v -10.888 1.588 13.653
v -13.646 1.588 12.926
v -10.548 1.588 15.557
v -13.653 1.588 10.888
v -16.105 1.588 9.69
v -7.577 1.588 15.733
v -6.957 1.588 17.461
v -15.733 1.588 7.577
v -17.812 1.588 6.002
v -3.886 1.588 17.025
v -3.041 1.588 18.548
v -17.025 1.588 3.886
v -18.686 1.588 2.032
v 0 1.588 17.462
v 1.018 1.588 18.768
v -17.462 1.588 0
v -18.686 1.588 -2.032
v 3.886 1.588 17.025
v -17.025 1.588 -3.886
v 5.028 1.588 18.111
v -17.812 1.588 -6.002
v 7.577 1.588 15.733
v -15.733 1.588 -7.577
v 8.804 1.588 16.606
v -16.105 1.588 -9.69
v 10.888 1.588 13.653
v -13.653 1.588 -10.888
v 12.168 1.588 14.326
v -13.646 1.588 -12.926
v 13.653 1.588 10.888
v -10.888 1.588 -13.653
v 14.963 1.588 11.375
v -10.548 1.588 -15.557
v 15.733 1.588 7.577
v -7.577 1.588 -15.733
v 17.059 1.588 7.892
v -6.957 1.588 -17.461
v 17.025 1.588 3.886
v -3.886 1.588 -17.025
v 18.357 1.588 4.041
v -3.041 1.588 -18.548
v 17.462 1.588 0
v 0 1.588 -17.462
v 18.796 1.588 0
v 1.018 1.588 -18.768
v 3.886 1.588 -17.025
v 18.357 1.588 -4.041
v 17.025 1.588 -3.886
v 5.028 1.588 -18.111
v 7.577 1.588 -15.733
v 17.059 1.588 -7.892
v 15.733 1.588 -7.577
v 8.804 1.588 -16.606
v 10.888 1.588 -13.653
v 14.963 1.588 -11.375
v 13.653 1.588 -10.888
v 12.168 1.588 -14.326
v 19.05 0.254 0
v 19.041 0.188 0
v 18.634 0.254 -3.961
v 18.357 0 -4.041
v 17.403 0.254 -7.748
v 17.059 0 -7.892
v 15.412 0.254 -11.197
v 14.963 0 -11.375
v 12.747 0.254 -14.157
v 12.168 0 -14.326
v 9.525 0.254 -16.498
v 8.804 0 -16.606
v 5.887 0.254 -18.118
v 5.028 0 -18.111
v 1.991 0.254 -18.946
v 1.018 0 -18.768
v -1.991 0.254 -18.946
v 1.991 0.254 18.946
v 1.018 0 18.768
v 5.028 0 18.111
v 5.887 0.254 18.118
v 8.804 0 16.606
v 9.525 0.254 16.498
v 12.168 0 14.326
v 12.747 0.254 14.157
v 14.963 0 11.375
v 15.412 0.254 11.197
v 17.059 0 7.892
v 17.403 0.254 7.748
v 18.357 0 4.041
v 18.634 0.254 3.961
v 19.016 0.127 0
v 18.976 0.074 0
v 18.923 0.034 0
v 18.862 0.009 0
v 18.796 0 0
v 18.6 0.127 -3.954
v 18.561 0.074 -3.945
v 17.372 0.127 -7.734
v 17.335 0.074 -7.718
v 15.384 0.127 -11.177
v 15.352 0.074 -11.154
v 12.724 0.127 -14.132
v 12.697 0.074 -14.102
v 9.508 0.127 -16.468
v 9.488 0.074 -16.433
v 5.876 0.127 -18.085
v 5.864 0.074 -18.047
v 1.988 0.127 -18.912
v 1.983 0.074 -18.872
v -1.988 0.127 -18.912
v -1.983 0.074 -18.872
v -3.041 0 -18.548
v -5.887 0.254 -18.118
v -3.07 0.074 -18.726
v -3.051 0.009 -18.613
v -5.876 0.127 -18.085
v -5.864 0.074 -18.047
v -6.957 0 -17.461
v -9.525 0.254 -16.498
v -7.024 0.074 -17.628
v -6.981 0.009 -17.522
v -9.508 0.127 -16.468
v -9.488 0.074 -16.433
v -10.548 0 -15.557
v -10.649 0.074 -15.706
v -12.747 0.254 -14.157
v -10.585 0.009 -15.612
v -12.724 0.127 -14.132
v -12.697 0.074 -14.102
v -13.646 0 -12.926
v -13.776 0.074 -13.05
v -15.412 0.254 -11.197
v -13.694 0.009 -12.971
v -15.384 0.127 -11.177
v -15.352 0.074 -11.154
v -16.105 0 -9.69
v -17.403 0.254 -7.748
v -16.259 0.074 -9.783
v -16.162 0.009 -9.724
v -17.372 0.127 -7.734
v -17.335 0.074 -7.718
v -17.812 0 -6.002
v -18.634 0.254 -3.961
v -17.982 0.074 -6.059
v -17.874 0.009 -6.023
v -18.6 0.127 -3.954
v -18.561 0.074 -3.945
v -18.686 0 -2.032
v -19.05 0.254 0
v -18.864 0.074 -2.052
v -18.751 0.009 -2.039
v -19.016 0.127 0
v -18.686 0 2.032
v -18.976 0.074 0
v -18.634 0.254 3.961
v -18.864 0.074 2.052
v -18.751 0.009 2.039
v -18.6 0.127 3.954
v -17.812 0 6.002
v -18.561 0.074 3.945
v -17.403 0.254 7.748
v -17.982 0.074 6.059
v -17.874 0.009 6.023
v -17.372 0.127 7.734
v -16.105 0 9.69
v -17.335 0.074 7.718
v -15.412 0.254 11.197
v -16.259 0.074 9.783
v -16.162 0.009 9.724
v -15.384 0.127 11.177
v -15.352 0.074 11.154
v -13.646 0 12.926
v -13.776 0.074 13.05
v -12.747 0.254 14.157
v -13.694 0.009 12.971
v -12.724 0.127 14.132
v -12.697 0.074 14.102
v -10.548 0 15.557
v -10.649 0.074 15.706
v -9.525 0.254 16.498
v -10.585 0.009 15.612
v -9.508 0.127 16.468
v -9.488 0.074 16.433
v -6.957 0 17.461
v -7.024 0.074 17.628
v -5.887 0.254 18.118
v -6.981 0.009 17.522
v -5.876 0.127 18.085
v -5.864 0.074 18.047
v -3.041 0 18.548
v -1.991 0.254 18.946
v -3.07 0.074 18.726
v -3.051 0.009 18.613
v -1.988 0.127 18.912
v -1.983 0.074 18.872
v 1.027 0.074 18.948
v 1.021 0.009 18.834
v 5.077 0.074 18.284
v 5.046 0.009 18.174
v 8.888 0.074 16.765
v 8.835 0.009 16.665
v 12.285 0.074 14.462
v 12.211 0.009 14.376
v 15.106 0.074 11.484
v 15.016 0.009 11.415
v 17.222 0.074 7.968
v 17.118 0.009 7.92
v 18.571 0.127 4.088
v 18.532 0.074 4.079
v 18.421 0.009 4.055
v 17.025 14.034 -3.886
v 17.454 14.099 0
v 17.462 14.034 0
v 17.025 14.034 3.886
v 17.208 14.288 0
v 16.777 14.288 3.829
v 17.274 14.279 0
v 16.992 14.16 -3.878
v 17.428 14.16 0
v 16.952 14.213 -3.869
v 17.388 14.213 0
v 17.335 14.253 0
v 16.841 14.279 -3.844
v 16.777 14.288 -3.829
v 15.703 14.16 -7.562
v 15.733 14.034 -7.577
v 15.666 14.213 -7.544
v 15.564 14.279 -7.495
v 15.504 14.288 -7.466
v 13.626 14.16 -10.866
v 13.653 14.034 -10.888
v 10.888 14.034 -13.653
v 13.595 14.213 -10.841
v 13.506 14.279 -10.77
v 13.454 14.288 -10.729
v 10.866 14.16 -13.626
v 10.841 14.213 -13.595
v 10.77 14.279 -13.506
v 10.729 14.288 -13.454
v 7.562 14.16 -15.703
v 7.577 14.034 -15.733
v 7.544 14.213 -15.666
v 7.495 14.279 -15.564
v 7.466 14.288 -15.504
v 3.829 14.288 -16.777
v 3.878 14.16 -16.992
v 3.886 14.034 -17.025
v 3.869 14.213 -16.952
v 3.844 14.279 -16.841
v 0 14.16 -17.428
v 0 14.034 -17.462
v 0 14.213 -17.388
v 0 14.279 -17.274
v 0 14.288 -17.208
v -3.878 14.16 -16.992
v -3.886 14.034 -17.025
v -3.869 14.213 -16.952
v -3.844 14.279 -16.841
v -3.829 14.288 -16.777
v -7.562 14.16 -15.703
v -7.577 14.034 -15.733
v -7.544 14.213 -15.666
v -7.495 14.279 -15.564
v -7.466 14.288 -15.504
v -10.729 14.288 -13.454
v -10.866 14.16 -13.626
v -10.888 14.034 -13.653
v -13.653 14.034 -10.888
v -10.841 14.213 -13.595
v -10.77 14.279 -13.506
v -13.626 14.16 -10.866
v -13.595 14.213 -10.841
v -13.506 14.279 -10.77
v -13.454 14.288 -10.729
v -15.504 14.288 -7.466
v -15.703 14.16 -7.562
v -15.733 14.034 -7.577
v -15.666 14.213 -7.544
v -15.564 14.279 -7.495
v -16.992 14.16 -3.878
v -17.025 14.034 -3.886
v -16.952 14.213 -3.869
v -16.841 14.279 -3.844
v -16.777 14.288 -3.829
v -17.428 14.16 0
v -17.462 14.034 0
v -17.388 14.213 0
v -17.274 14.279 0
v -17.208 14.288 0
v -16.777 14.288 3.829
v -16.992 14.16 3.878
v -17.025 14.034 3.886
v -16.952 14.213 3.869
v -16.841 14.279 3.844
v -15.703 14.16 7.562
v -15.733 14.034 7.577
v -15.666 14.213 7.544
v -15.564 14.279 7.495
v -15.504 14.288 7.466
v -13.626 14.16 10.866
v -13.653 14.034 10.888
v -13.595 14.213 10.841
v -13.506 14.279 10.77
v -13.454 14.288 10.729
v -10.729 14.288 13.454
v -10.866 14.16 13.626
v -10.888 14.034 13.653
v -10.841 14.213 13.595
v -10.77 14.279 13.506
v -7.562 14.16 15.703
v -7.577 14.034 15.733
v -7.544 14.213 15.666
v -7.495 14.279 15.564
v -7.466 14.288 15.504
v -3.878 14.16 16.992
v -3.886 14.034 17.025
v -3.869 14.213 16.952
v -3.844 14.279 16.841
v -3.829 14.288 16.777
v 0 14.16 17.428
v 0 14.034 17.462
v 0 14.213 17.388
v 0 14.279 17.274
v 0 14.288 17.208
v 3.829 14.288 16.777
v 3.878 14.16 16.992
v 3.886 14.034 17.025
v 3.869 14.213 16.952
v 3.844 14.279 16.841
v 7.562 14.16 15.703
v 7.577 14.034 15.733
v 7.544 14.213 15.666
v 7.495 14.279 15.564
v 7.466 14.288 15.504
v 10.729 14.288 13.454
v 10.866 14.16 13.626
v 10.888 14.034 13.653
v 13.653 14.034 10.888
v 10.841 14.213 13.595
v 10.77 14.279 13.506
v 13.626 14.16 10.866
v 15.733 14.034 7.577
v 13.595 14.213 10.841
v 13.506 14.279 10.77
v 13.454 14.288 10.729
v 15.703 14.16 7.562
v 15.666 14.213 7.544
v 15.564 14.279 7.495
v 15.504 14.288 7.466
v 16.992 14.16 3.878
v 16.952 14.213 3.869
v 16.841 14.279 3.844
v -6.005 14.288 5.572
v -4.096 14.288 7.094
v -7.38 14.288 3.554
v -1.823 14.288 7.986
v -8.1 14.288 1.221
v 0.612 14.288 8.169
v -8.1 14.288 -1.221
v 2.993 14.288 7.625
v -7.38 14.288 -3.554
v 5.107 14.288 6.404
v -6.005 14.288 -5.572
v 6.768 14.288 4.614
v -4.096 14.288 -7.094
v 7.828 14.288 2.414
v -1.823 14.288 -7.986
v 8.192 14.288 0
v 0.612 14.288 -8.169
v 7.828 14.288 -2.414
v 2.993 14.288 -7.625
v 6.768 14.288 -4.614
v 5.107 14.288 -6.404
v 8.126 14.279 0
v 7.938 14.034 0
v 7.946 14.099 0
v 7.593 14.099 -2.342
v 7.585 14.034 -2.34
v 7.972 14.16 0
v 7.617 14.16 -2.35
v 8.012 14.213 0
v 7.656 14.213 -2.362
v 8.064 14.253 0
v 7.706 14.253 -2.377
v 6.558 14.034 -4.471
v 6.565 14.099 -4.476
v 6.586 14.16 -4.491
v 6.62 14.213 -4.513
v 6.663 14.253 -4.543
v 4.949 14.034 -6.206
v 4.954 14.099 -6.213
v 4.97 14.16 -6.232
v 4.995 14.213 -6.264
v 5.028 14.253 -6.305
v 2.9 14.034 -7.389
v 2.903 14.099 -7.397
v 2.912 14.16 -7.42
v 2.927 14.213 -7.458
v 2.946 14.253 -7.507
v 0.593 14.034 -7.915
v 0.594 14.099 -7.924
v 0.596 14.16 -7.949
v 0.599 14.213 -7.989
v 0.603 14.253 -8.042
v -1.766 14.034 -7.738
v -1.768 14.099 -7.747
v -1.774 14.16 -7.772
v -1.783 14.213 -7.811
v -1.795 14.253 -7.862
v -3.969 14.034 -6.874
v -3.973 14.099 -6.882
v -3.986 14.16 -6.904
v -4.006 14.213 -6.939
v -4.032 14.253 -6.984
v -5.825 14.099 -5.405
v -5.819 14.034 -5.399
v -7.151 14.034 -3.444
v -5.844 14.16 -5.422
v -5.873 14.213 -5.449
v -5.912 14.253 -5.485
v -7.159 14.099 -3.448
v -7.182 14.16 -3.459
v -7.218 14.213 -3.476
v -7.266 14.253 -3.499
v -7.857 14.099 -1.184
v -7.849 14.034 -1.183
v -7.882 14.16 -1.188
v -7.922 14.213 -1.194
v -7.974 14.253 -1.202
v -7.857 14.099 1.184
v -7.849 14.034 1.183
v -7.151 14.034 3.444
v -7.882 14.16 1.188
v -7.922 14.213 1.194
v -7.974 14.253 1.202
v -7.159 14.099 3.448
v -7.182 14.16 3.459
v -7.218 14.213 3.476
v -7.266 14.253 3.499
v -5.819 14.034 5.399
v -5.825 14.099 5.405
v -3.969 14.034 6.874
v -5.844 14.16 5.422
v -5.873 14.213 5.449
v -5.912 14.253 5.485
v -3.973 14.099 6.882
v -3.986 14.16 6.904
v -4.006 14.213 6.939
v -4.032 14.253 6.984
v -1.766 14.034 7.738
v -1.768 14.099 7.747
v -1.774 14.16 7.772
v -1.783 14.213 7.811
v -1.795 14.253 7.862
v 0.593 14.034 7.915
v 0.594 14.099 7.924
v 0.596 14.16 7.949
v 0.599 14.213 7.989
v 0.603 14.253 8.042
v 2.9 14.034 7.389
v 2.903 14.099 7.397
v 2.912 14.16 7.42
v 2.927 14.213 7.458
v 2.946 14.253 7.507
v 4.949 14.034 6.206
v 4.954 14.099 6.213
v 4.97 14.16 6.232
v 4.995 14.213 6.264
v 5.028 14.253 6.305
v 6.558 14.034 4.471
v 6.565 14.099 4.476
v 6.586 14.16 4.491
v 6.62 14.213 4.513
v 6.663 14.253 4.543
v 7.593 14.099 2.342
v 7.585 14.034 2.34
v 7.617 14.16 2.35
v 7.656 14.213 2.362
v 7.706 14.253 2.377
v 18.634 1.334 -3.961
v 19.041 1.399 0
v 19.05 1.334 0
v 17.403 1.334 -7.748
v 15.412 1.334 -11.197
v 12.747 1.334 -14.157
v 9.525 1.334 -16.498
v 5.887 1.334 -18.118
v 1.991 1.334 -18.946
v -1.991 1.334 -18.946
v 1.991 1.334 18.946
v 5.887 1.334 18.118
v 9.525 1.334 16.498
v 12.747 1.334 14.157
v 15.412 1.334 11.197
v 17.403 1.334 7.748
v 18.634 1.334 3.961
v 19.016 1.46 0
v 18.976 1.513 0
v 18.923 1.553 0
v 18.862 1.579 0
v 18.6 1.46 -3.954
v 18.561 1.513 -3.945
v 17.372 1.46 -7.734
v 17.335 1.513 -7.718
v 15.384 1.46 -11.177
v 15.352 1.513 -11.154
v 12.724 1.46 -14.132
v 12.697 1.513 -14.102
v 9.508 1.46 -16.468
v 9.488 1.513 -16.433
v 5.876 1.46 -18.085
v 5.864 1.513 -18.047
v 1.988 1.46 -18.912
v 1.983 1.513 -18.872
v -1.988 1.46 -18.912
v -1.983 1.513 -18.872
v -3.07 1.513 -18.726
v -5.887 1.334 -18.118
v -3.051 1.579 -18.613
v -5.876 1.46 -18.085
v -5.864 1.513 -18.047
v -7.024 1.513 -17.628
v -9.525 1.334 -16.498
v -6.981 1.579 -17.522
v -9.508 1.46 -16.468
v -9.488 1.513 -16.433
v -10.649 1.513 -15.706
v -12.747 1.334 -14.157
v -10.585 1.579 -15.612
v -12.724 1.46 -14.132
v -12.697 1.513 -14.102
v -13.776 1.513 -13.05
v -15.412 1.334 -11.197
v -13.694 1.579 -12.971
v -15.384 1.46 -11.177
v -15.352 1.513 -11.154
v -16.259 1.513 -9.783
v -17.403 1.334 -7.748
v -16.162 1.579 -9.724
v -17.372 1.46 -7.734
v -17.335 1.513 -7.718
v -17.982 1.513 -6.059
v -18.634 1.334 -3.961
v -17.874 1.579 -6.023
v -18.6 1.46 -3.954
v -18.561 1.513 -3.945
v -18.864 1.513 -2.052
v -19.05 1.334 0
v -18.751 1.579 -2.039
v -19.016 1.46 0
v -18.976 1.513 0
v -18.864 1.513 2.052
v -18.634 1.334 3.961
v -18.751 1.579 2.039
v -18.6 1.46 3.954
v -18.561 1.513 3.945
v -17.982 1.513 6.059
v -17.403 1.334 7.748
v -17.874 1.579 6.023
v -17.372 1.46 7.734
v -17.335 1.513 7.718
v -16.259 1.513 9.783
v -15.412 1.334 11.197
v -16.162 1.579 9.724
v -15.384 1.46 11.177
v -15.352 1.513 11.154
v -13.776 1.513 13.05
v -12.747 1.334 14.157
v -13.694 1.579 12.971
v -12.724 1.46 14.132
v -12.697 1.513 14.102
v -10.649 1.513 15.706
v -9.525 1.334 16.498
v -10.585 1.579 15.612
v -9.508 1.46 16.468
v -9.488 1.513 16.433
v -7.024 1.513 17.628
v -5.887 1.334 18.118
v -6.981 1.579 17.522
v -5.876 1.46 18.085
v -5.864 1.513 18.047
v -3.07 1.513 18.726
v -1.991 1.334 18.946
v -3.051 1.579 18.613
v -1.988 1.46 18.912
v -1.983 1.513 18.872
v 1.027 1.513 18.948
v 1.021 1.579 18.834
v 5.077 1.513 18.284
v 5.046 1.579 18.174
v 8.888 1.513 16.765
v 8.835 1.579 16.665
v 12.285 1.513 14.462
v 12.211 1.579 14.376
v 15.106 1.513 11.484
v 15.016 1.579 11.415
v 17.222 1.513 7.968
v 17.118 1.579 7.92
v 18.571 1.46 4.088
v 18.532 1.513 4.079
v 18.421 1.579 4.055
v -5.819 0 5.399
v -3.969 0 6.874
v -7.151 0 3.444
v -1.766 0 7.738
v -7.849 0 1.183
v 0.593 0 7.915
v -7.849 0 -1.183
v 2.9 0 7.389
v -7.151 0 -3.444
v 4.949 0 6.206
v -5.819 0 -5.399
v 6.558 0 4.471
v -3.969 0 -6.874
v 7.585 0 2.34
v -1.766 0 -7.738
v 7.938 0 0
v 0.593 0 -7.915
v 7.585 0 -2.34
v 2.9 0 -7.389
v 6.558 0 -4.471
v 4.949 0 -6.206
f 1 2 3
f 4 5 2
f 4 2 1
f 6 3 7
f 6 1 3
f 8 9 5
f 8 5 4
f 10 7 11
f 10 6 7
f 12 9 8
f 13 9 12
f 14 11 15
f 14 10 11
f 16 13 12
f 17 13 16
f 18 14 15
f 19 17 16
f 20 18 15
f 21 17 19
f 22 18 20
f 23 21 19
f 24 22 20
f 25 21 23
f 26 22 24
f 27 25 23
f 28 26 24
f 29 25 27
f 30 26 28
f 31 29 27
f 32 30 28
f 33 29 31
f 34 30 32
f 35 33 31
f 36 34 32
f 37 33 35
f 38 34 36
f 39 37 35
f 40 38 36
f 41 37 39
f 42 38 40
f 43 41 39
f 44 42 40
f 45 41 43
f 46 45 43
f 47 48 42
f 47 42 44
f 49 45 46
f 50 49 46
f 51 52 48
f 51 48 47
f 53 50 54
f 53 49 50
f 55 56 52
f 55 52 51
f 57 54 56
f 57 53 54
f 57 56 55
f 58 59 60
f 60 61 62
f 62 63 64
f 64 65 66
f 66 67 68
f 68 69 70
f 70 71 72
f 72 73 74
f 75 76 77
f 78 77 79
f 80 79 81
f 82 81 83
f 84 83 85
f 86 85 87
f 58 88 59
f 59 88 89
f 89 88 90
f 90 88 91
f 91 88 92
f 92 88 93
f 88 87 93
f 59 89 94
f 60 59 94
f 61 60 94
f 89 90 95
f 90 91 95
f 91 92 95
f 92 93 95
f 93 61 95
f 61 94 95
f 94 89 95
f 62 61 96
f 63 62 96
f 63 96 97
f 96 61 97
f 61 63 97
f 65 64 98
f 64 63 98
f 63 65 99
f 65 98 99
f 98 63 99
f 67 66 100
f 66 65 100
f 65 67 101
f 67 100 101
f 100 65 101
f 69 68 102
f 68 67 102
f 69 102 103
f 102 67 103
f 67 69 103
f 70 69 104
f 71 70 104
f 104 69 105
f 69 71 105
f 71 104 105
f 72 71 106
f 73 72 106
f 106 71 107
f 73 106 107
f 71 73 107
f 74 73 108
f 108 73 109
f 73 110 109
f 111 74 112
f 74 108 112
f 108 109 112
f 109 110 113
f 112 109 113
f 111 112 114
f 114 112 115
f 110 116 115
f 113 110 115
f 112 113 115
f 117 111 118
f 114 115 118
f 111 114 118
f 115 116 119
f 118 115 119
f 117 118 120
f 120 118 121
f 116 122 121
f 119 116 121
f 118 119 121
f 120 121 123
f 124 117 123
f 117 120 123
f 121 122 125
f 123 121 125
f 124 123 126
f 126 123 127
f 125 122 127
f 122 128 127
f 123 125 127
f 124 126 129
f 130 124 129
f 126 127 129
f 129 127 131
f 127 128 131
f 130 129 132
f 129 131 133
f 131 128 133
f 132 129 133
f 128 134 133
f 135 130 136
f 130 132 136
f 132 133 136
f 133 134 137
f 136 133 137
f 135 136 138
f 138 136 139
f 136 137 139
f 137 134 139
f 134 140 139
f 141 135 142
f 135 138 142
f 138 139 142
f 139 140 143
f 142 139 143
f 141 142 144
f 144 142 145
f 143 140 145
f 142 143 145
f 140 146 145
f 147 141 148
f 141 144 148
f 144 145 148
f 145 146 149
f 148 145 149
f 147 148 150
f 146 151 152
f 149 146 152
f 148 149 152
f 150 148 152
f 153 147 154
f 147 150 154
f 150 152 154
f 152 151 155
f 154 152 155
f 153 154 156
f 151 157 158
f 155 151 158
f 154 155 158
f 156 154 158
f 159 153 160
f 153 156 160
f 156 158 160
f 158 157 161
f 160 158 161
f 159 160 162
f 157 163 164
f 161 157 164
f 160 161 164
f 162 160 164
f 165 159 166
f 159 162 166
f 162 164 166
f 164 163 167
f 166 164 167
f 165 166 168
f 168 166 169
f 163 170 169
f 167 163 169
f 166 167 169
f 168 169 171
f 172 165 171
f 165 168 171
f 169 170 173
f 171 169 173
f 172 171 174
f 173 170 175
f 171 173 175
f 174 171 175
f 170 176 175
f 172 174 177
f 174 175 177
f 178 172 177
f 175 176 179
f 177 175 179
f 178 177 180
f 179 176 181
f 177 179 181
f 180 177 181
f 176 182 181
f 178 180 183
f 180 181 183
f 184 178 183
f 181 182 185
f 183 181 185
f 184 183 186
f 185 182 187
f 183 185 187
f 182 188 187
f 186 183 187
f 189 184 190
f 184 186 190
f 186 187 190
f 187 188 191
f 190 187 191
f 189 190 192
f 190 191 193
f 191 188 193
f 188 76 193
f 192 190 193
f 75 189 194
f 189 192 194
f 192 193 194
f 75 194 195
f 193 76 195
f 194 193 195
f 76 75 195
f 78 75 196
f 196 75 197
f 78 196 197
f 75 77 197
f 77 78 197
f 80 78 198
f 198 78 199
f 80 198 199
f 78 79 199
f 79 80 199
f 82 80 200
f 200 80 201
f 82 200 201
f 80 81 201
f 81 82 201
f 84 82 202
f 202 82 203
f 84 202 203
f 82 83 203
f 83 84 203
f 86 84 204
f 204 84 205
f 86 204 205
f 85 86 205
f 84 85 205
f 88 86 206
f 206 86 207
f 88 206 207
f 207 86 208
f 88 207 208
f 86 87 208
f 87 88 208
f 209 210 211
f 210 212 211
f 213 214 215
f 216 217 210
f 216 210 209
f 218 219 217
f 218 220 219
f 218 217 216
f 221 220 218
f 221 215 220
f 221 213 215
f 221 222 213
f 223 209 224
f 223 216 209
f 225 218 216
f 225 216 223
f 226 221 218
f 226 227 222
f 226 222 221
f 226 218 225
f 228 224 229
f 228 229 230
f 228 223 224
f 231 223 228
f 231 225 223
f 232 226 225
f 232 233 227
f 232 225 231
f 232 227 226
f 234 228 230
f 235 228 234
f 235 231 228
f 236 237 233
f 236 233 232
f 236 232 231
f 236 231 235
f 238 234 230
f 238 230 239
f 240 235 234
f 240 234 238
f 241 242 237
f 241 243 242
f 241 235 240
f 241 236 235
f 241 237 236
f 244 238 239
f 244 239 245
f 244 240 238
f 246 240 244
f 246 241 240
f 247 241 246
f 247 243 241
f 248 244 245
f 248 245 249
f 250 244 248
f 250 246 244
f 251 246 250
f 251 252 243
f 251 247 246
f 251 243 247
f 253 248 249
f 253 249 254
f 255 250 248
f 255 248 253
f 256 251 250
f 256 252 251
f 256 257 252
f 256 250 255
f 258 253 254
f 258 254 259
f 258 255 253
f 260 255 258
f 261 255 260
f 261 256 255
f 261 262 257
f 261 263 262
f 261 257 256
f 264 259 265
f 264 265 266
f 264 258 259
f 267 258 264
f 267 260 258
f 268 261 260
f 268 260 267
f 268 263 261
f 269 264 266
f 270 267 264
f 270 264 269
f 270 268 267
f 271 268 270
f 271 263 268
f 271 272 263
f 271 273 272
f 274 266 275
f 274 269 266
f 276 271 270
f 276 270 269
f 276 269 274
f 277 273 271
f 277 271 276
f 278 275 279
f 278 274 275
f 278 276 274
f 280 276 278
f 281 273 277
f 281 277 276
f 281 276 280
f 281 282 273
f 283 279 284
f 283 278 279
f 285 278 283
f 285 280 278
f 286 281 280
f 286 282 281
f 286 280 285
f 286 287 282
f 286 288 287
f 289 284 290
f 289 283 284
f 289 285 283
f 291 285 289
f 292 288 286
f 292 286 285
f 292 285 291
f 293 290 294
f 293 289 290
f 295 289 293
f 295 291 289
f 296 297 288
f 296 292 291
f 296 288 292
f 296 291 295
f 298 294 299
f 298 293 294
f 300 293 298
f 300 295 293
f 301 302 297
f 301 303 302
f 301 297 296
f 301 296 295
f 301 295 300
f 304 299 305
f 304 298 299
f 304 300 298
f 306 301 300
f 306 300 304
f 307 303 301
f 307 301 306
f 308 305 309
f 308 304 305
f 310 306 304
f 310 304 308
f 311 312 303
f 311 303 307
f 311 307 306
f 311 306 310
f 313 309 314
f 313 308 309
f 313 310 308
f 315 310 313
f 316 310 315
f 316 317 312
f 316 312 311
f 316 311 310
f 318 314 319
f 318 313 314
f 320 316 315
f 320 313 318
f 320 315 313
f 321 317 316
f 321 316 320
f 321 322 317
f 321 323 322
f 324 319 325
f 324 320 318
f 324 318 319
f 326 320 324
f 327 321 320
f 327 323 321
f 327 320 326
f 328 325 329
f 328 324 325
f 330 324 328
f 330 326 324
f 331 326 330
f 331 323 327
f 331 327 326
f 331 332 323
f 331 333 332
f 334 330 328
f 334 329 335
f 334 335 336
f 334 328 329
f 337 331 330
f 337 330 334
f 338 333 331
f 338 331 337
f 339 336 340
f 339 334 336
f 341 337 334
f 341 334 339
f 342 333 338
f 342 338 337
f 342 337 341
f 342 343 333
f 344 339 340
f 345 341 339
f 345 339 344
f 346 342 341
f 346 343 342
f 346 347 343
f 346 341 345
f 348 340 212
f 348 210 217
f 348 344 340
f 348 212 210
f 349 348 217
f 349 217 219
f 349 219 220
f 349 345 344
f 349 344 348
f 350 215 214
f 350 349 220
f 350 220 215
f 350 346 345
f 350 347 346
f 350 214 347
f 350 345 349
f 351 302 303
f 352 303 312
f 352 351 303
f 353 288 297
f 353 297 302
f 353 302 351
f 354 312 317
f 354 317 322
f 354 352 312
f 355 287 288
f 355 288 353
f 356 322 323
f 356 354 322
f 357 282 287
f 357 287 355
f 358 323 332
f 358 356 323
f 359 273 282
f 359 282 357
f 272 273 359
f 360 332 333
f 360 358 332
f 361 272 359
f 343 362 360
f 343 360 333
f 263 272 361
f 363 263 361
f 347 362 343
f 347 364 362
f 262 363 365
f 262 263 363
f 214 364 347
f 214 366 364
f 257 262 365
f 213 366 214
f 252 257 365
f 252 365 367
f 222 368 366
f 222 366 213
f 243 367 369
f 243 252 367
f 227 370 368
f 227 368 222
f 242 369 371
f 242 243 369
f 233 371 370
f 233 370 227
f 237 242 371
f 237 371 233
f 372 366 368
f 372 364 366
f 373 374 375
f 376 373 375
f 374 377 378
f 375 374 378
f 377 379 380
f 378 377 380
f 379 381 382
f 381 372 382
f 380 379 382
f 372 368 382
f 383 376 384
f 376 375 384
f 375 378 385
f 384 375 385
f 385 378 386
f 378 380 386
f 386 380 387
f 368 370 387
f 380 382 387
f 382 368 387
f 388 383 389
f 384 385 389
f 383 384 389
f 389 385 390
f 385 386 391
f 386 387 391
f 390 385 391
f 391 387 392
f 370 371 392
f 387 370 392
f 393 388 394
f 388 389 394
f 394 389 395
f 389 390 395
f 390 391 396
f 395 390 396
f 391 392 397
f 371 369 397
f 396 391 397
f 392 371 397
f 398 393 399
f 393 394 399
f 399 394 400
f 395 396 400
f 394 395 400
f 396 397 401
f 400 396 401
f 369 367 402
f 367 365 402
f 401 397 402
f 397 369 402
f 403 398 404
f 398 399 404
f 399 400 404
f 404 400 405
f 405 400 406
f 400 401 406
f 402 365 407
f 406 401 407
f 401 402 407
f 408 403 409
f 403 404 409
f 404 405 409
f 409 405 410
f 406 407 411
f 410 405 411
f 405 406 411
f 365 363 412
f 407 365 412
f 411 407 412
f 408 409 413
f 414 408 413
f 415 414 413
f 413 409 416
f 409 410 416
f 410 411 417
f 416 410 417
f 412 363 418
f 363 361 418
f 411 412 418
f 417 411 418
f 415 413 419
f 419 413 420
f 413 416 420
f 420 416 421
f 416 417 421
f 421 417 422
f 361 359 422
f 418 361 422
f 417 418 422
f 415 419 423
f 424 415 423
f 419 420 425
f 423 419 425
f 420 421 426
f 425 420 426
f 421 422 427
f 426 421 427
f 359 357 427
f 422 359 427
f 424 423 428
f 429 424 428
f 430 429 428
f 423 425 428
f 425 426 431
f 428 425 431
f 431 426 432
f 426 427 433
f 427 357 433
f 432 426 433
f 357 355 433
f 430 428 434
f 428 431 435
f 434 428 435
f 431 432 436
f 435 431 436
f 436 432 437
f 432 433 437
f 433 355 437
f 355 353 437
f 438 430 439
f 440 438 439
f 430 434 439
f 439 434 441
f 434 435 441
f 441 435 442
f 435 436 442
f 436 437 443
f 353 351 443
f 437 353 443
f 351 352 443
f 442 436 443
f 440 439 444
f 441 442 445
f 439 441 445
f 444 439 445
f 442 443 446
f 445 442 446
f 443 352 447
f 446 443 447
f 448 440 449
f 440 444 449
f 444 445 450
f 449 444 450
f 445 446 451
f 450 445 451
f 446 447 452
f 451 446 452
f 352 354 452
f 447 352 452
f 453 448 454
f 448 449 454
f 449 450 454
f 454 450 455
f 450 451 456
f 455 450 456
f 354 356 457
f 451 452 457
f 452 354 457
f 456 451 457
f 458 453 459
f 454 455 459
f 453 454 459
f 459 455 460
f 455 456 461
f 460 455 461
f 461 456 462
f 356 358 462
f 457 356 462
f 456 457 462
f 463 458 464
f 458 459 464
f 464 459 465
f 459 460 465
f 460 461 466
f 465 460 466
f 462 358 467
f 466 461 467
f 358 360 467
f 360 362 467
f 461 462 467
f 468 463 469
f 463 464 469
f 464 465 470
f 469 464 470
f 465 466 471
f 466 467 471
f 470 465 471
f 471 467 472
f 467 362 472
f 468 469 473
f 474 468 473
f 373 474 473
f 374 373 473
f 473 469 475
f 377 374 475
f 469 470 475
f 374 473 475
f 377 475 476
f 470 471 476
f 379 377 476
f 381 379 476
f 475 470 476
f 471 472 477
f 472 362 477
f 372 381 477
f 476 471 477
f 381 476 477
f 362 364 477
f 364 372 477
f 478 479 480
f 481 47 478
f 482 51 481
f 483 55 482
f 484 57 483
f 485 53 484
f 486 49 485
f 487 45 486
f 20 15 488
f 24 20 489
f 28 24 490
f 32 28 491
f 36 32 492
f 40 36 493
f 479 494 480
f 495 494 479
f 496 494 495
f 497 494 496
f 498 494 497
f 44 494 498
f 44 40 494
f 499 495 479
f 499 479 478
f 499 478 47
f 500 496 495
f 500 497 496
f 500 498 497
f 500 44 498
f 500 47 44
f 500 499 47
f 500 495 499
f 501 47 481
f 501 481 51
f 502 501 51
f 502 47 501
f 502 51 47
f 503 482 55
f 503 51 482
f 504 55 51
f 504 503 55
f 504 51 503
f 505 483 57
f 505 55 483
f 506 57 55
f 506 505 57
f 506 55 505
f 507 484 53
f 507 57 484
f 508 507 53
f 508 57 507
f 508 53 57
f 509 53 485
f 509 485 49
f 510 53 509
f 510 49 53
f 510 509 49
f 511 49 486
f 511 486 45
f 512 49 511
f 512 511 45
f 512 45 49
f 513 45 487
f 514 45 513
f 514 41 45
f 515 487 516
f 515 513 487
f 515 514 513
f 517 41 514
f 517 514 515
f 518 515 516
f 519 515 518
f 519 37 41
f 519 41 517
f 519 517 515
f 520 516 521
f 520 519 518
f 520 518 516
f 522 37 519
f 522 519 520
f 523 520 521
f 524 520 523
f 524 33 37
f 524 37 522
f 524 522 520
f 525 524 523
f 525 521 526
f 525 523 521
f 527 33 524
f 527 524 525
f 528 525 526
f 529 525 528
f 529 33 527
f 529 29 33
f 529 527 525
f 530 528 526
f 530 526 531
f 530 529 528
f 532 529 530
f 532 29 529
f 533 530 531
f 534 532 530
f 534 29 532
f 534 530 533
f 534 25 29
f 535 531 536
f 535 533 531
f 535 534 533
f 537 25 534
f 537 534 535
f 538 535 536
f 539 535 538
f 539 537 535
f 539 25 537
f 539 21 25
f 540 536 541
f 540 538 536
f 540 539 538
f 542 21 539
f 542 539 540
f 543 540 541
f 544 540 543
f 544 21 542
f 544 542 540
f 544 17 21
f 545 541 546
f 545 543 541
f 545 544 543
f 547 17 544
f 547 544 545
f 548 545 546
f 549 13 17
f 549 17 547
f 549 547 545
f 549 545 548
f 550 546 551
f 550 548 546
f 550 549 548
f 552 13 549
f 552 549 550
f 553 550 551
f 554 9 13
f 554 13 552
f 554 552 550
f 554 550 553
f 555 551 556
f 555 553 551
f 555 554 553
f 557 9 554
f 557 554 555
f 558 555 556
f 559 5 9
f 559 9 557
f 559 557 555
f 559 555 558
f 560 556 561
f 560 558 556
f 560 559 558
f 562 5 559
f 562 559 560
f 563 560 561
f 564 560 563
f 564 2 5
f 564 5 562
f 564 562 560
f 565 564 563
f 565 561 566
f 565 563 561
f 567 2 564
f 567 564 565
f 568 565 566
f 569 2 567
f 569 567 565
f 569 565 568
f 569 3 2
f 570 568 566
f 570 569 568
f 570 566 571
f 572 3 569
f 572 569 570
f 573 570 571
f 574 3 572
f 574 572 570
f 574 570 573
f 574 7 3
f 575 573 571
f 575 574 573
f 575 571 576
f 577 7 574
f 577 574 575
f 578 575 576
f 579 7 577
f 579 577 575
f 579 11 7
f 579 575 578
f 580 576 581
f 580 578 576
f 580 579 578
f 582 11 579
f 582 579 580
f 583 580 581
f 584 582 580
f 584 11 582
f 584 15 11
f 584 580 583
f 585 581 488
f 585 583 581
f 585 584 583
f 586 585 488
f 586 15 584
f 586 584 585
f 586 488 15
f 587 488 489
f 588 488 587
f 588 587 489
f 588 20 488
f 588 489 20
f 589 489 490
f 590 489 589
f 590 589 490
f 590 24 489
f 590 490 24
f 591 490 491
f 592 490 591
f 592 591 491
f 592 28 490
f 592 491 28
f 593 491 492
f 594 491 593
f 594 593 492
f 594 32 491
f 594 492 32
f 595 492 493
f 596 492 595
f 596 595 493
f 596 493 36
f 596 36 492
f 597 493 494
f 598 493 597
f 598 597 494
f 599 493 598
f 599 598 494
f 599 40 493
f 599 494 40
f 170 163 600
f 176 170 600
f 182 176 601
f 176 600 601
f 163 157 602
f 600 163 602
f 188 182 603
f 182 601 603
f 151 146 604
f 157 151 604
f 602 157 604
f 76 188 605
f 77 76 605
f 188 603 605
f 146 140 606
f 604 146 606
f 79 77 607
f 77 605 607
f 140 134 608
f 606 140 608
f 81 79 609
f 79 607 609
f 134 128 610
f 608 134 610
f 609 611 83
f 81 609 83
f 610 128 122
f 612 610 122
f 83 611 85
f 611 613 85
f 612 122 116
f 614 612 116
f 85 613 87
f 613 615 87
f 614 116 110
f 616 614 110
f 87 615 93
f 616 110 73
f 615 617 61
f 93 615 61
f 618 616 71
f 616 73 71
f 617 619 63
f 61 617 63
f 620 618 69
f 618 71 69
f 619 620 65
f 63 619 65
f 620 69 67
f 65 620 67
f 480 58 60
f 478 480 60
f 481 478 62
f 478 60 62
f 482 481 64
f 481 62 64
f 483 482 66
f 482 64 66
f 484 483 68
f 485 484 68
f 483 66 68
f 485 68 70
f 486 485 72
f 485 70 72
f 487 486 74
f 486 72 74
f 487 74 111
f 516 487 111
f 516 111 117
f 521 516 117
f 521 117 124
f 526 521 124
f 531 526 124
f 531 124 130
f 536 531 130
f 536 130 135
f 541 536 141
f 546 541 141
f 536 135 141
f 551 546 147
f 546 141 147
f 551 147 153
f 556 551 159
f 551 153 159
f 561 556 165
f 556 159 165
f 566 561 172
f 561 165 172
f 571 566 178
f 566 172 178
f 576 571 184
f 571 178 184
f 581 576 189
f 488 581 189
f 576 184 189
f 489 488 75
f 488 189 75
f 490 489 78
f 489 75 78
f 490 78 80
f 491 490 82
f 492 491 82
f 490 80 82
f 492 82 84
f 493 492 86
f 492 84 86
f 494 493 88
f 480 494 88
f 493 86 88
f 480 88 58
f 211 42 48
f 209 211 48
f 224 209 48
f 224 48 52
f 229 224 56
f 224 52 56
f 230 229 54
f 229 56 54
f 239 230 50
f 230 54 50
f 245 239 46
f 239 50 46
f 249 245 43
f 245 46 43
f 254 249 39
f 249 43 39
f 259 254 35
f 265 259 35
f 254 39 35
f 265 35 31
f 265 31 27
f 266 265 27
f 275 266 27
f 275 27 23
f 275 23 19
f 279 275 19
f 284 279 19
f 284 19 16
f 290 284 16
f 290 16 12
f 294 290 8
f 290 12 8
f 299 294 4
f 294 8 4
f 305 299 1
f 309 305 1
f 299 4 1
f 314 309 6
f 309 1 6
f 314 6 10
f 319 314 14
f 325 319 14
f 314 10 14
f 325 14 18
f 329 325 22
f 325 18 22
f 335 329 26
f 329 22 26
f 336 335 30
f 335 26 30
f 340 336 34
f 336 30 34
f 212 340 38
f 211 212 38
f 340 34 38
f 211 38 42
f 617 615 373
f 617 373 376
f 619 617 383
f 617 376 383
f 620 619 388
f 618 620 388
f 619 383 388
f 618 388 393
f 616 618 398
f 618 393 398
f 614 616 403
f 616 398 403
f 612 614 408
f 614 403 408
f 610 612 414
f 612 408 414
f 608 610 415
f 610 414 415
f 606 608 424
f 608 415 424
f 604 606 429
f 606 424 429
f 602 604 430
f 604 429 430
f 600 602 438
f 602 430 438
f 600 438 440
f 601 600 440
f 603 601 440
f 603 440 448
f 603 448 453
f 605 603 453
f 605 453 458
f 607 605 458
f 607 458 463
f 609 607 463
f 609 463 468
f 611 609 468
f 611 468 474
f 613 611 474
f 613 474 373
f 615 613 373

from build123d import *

# Parameters (mm, degrees)
SKETCH1_R           = 19.05
BOSS_EXTRUDE1_DEPTH = 1.5875
SKETCH2_R           = 17.4625
BOSS_EXTRUDE2_DEPTH = 12.7
SKETCH3_R           = 7.9375
CUT_EXTRUDE1_DEPTH  = 15.2875
FILLET1_R           = 0.254


with BuildPart() as part:
    # Sketch1 → Boss-Extrude1 (new body)
    with BuildSketch(Plane(origin=(0, 0, 0), x_dir=(1, 0, 0), z_dir=(0, 1, 0))):
        Circle(SKETCH1_R)
    extrude(amount=BOSS_EXTRUDE1_DEPTH)

    # Sketch2 → Boss-Extrude2 (add)
    with BuildSketch(Plane(origin=(0, 1.5875, 0), x_dir=(1, 0, 0), z_dir=(0, 1, 0))):
        Circle(SKETCH2_R)
    extrude(amount=BOSS_EXTRUDE2_DEPTH)

    # Sketch3 → Cut-Extrude1 (cut, through all)
    with BuildSketch(Plane(origin=(0, 14.2875, 0), x_dir=(1, 0, 0), z_dir=(0, 1, 0))):
        Circle(SKETCH3_R)
    extrude(amount=-CUT_EXTRUDE1_DEPTH, mode=Mode.SUBTRACT)

    # Fillet1
    fillet1_edges = [part.edges().sort_by_distance(p)[0] for p in [
        (-7.9375, 14.2875, 0),
        (-19.05, 0, 0),
        (-19.05, 1.5875, 0),
        (-17.4625, 14.2875, 0),
    ]]
    fillet(fillet1_edges, radius=FILLET1_R)


solid = part.part
